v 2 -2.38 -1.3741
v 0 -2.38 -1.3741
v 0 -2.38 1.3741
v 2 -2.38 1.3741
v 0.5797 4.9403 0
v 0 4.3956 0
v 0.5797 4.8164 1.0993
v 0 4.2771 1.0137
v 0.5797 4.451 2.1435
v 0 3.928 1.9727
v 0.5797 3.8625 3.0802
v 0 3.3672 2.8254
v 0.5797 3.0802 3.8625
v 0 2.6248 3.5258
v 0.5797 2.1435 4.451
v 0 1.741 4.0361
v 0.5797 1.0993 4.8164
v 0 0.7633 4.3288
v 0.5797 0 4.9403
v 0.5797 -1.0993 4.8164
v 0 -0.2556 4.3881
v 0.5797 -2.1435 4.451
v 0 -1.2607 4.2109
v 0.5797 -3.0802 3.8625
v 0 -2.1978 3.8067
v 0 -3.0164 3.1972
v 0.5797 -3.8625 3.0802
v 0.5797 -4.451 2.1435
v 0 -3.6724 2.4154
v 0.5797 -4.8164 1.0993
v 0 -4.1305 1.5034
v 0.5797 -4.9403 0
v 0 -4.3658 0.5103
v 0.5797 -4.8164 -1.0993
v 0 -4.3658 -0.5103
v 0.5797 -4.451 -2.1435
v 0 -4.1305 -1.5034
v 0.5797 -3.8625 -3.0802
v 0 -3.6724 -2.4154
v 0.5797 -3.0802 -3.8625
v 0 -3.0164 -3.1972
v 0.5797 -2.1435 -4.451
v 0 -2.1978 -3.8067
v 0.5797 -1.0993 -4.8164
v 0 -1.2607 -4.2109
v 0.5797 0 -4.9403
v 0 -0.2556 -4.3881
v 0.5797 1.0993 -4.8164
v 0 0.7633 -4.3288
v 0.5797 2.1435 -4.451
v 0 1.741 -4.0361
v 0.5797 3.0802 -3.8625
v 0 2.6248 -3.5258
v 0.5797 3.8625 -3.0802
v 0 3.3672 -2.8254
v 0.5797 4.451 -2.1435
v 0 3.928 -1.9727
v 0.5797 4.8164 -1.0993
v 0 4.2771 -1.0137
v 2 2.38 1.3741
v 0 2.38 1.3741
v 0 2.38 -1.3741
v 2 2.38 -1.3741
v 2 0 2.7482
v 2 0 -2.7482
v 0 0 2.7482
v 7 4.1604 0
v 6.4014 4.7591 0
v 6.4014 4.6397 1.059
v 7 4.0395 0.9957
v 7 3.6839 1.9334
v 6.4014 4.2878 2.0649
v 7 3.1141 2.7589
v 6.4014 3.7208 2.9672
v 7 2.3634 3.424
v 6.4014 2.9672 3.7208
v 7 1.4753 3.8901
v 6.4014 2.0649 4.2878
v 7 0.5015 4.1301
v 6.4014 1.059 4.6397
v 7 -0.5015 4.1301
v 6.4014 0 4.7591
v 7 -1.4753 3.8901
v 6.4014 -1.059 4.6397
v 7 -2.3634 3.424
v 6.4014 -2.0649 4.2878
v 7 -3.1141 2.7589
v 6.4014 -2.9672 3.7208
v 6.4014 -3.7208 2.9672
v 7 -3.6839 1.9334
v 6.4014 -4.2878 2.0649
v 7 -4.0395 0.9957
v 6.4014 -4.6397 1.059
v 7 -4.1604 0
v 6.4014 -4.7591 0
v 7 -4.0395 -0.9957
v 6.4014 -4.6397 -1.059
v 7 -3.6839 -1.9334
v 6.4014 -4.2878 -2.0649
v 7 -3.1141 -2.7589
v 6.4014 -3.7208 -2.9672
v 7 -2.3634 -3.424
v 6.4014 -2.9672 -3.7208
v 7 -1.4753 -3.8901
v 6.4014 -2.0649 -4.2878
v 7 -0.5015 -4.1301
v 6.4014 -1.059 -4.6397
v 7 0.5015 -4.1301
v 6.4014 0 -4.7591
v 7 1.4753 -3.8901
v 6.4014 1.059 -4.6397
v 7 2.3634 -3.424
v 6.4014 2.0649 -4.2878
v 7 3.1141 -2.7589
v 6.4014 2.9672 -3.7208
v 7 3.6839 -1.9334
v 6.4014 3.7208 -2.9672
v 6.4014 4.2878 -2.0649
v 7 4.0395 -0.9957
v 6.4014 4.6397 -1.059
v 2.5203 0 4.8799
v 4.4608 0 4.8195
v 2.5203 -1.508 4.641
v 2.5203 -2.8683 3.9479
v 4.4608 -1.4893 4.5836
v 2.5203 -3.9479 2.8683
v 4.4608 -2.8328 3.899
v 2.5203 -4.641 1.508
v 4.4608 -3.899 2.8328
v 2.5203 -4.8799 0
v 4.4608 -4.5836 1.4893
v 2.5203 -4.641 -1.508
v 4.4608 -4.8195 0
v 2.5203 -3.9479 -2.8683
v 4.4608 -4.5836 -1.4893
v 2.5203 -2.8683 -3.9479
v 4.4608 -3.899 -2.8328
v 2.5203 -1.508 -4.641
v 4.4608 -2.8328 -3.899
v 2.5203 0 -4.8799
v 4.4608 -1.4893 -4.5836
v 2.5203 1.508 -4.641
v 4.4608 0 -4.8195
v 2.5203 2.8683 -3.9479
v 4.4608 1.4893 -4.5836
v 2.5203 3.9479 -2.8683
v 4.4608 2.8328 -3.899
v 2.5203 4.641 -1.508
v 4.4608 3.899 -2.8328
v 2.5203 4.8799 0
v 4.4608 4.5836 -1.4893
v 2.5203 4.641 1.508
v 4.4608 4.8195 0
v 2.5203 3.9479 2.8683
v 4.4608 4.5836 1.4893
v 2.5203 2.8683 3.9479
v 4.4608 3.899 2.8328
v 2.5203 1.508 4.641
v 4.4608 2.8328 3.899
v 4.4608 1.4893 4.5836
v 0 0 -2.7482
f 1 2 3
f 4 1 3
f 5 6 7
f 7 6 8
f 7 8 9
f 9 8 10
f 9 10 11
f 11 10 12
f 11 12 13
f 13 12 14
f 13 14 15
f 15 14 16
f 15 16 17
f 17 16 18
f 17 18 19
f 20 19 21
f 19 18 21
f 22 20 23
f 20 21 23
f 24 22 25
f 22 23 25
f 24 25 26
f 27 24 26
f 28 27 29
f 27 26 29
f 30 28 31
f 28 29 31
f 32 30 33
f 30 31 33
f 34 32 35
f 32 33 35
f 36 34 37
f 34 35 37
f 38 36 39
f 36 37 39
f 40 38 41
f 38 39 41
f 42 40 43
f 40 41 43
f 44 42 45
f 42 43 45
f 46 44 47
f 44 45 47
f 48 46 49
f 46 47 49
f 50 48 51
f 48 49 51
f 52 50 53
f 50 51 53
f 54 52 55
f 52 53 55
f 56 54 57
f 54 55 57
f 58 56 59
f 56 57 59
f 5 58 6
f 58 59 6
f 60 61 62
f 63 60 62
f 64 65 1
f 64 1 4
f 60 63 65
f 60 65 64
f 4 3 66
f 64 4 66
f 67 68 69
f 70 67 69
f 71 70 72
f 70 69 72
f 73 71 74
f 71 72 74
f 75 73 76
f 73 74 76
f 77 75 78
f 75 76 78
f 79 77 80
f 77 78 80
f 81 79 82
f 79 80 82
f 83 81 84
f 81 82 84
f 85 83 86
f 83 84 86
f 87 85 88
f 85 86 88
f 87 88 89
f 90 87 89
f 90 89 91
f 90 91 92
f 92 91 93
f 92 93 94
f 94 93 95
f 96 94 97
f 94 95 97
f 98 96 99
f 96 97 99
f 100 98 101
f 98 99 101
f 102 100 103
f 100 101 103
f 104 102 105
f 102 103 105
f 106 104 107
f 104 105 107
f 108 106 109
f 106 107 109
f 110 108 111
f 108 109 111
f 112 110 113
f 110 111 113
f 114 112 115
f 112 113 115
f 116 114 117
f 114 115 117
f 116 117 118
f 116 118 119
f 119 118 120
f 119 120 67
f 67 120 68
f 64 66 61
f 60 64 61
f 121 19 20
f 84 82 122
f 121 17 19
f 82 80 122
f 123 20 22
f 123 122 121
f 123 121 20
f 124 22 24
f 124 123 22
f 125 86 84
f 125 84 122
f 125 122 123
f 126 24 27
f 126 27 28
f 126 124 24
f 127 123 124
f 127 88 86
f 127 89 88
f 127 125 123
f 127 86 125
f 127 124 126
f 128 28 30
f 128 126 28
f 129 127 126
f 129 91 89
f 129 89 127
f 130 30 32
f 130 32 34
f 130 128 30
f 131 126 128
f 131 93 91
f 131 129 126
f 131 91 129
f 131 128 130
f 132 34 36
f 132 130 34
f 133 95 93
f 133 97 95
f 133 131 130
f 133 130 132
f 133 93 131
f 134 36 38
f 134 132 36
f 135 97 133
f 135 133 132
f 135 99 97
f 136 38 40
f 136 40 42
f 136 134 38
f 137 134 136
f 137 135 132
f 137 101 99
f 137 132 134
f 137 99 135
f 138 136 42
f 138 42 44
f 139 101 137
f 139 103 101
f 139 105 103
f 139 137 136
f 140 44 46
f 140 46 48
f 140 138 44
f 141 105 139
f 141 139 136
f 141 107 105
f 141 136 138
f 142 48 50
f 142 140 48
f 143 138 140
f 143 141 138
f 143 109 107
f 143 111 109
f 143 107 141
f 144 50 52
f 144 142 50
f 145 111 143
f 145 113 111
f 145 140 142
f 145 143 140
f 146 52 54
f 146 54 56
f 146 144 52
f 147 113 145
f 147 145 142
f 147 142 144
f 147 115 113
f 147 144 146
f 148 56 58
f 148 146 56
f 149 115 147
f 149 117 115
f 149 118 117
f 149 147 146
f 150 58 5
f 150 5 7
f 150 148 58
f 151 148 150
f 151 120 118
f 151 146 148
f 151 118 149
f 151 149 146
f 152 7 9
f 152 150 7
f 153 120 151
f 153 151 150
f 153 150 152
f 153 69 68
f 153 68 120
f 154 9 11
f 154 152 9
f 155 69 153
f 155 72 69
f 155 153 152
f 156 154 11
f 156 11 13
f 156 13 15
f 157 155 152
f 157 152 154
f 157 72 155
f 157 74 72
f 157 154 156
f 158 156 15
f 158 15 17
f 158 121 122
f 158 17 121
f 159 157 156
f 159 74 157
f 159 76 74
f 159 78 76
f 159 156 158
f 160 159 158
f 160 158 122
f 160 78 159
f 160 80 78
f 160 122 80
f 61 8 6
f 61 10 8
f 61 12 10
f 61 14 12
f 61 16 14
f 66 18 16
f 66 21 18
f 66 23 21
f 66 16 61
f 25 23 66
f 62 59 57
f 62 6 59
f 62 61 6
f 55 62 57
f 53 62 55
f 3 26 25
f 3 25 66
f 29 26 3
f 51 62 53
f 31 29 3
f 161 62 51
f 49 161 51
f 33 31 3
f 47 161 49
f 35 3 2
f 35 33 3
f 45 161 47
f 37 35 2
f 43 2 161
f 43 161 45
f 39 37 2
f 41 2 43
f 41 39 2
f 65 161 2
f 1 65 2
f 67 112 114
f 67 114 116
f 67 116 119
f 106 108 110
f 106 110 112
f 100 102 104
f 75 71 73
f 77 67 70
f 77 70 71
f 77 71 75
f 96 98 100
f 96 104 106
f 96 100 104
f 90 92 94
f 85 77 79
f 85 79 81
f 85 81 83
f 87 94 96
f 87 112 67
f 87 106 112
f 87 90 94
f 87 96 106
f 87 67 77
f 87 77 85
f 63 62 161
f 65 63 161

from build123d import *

# Parameters (mm, degrees)
HEX_2_DEPTH = 2


with BuildPart() as part:
    # Threads_Sketch → Threads (revolve)
    with BuildSketch(Plane.XY, mode=Mode.PRIVATE) as threads_sk:
        Polygon((0, 0), (0, 4.958321687), (7, 4.740416799), (7, 0), align=None)
    revolve(threads_sk.sketch.rotate(Axis((-5.91867895, 0, 0), (1, 0, 0)), 90), axis=Axis((-5.91867895, 0, 0), (1, 0, 0)))

    # Threads Cham: read off the stored shape, not the designer's step
    # Threads Cham outline → Threads Cham (revolve, cut)
    with BuildSketch(Plane.YX):
        Polygon((4.160416799, 7), (4.759051872, 6.401364927), (4.759051872, 7), align=None)
        Polygon((4.940275453, 0), (4.940275453, 0.579719185), (4.395559124, 0), align=None)
    revolve(axis=Axis((0, 0, 0), (1, 0, 0)), mode=Mode.SUBTRACT)

    # Threads Cham 2 outline → Threads Cham 2 (revolve, cut)
    with BuildSketch(Plane.YX):
        Polygon((4.940275453, 0.579719185), (4.940275453, 0), (4.958321687, 0), align=None)
    revolve(axis=Axis((0, 0, 0), (1, 0, 0)), mode=Mode.SUBTRACT)

    # Hex_Sketch → Hex 2 (cut)
    with BuildSketch(Plane.ZY):
        Polygon((2.748187281, 0), (1.374093641, 2.38), (-1.374093641, 2.38), (-2.748187281, 0), (-1.374093641, -2.38), (1.374093641, -2.38), align=None)
    extrude(amount=-HEX_2_DEPTH, mode=Mode.SUBTRACT)


solid = part.part
